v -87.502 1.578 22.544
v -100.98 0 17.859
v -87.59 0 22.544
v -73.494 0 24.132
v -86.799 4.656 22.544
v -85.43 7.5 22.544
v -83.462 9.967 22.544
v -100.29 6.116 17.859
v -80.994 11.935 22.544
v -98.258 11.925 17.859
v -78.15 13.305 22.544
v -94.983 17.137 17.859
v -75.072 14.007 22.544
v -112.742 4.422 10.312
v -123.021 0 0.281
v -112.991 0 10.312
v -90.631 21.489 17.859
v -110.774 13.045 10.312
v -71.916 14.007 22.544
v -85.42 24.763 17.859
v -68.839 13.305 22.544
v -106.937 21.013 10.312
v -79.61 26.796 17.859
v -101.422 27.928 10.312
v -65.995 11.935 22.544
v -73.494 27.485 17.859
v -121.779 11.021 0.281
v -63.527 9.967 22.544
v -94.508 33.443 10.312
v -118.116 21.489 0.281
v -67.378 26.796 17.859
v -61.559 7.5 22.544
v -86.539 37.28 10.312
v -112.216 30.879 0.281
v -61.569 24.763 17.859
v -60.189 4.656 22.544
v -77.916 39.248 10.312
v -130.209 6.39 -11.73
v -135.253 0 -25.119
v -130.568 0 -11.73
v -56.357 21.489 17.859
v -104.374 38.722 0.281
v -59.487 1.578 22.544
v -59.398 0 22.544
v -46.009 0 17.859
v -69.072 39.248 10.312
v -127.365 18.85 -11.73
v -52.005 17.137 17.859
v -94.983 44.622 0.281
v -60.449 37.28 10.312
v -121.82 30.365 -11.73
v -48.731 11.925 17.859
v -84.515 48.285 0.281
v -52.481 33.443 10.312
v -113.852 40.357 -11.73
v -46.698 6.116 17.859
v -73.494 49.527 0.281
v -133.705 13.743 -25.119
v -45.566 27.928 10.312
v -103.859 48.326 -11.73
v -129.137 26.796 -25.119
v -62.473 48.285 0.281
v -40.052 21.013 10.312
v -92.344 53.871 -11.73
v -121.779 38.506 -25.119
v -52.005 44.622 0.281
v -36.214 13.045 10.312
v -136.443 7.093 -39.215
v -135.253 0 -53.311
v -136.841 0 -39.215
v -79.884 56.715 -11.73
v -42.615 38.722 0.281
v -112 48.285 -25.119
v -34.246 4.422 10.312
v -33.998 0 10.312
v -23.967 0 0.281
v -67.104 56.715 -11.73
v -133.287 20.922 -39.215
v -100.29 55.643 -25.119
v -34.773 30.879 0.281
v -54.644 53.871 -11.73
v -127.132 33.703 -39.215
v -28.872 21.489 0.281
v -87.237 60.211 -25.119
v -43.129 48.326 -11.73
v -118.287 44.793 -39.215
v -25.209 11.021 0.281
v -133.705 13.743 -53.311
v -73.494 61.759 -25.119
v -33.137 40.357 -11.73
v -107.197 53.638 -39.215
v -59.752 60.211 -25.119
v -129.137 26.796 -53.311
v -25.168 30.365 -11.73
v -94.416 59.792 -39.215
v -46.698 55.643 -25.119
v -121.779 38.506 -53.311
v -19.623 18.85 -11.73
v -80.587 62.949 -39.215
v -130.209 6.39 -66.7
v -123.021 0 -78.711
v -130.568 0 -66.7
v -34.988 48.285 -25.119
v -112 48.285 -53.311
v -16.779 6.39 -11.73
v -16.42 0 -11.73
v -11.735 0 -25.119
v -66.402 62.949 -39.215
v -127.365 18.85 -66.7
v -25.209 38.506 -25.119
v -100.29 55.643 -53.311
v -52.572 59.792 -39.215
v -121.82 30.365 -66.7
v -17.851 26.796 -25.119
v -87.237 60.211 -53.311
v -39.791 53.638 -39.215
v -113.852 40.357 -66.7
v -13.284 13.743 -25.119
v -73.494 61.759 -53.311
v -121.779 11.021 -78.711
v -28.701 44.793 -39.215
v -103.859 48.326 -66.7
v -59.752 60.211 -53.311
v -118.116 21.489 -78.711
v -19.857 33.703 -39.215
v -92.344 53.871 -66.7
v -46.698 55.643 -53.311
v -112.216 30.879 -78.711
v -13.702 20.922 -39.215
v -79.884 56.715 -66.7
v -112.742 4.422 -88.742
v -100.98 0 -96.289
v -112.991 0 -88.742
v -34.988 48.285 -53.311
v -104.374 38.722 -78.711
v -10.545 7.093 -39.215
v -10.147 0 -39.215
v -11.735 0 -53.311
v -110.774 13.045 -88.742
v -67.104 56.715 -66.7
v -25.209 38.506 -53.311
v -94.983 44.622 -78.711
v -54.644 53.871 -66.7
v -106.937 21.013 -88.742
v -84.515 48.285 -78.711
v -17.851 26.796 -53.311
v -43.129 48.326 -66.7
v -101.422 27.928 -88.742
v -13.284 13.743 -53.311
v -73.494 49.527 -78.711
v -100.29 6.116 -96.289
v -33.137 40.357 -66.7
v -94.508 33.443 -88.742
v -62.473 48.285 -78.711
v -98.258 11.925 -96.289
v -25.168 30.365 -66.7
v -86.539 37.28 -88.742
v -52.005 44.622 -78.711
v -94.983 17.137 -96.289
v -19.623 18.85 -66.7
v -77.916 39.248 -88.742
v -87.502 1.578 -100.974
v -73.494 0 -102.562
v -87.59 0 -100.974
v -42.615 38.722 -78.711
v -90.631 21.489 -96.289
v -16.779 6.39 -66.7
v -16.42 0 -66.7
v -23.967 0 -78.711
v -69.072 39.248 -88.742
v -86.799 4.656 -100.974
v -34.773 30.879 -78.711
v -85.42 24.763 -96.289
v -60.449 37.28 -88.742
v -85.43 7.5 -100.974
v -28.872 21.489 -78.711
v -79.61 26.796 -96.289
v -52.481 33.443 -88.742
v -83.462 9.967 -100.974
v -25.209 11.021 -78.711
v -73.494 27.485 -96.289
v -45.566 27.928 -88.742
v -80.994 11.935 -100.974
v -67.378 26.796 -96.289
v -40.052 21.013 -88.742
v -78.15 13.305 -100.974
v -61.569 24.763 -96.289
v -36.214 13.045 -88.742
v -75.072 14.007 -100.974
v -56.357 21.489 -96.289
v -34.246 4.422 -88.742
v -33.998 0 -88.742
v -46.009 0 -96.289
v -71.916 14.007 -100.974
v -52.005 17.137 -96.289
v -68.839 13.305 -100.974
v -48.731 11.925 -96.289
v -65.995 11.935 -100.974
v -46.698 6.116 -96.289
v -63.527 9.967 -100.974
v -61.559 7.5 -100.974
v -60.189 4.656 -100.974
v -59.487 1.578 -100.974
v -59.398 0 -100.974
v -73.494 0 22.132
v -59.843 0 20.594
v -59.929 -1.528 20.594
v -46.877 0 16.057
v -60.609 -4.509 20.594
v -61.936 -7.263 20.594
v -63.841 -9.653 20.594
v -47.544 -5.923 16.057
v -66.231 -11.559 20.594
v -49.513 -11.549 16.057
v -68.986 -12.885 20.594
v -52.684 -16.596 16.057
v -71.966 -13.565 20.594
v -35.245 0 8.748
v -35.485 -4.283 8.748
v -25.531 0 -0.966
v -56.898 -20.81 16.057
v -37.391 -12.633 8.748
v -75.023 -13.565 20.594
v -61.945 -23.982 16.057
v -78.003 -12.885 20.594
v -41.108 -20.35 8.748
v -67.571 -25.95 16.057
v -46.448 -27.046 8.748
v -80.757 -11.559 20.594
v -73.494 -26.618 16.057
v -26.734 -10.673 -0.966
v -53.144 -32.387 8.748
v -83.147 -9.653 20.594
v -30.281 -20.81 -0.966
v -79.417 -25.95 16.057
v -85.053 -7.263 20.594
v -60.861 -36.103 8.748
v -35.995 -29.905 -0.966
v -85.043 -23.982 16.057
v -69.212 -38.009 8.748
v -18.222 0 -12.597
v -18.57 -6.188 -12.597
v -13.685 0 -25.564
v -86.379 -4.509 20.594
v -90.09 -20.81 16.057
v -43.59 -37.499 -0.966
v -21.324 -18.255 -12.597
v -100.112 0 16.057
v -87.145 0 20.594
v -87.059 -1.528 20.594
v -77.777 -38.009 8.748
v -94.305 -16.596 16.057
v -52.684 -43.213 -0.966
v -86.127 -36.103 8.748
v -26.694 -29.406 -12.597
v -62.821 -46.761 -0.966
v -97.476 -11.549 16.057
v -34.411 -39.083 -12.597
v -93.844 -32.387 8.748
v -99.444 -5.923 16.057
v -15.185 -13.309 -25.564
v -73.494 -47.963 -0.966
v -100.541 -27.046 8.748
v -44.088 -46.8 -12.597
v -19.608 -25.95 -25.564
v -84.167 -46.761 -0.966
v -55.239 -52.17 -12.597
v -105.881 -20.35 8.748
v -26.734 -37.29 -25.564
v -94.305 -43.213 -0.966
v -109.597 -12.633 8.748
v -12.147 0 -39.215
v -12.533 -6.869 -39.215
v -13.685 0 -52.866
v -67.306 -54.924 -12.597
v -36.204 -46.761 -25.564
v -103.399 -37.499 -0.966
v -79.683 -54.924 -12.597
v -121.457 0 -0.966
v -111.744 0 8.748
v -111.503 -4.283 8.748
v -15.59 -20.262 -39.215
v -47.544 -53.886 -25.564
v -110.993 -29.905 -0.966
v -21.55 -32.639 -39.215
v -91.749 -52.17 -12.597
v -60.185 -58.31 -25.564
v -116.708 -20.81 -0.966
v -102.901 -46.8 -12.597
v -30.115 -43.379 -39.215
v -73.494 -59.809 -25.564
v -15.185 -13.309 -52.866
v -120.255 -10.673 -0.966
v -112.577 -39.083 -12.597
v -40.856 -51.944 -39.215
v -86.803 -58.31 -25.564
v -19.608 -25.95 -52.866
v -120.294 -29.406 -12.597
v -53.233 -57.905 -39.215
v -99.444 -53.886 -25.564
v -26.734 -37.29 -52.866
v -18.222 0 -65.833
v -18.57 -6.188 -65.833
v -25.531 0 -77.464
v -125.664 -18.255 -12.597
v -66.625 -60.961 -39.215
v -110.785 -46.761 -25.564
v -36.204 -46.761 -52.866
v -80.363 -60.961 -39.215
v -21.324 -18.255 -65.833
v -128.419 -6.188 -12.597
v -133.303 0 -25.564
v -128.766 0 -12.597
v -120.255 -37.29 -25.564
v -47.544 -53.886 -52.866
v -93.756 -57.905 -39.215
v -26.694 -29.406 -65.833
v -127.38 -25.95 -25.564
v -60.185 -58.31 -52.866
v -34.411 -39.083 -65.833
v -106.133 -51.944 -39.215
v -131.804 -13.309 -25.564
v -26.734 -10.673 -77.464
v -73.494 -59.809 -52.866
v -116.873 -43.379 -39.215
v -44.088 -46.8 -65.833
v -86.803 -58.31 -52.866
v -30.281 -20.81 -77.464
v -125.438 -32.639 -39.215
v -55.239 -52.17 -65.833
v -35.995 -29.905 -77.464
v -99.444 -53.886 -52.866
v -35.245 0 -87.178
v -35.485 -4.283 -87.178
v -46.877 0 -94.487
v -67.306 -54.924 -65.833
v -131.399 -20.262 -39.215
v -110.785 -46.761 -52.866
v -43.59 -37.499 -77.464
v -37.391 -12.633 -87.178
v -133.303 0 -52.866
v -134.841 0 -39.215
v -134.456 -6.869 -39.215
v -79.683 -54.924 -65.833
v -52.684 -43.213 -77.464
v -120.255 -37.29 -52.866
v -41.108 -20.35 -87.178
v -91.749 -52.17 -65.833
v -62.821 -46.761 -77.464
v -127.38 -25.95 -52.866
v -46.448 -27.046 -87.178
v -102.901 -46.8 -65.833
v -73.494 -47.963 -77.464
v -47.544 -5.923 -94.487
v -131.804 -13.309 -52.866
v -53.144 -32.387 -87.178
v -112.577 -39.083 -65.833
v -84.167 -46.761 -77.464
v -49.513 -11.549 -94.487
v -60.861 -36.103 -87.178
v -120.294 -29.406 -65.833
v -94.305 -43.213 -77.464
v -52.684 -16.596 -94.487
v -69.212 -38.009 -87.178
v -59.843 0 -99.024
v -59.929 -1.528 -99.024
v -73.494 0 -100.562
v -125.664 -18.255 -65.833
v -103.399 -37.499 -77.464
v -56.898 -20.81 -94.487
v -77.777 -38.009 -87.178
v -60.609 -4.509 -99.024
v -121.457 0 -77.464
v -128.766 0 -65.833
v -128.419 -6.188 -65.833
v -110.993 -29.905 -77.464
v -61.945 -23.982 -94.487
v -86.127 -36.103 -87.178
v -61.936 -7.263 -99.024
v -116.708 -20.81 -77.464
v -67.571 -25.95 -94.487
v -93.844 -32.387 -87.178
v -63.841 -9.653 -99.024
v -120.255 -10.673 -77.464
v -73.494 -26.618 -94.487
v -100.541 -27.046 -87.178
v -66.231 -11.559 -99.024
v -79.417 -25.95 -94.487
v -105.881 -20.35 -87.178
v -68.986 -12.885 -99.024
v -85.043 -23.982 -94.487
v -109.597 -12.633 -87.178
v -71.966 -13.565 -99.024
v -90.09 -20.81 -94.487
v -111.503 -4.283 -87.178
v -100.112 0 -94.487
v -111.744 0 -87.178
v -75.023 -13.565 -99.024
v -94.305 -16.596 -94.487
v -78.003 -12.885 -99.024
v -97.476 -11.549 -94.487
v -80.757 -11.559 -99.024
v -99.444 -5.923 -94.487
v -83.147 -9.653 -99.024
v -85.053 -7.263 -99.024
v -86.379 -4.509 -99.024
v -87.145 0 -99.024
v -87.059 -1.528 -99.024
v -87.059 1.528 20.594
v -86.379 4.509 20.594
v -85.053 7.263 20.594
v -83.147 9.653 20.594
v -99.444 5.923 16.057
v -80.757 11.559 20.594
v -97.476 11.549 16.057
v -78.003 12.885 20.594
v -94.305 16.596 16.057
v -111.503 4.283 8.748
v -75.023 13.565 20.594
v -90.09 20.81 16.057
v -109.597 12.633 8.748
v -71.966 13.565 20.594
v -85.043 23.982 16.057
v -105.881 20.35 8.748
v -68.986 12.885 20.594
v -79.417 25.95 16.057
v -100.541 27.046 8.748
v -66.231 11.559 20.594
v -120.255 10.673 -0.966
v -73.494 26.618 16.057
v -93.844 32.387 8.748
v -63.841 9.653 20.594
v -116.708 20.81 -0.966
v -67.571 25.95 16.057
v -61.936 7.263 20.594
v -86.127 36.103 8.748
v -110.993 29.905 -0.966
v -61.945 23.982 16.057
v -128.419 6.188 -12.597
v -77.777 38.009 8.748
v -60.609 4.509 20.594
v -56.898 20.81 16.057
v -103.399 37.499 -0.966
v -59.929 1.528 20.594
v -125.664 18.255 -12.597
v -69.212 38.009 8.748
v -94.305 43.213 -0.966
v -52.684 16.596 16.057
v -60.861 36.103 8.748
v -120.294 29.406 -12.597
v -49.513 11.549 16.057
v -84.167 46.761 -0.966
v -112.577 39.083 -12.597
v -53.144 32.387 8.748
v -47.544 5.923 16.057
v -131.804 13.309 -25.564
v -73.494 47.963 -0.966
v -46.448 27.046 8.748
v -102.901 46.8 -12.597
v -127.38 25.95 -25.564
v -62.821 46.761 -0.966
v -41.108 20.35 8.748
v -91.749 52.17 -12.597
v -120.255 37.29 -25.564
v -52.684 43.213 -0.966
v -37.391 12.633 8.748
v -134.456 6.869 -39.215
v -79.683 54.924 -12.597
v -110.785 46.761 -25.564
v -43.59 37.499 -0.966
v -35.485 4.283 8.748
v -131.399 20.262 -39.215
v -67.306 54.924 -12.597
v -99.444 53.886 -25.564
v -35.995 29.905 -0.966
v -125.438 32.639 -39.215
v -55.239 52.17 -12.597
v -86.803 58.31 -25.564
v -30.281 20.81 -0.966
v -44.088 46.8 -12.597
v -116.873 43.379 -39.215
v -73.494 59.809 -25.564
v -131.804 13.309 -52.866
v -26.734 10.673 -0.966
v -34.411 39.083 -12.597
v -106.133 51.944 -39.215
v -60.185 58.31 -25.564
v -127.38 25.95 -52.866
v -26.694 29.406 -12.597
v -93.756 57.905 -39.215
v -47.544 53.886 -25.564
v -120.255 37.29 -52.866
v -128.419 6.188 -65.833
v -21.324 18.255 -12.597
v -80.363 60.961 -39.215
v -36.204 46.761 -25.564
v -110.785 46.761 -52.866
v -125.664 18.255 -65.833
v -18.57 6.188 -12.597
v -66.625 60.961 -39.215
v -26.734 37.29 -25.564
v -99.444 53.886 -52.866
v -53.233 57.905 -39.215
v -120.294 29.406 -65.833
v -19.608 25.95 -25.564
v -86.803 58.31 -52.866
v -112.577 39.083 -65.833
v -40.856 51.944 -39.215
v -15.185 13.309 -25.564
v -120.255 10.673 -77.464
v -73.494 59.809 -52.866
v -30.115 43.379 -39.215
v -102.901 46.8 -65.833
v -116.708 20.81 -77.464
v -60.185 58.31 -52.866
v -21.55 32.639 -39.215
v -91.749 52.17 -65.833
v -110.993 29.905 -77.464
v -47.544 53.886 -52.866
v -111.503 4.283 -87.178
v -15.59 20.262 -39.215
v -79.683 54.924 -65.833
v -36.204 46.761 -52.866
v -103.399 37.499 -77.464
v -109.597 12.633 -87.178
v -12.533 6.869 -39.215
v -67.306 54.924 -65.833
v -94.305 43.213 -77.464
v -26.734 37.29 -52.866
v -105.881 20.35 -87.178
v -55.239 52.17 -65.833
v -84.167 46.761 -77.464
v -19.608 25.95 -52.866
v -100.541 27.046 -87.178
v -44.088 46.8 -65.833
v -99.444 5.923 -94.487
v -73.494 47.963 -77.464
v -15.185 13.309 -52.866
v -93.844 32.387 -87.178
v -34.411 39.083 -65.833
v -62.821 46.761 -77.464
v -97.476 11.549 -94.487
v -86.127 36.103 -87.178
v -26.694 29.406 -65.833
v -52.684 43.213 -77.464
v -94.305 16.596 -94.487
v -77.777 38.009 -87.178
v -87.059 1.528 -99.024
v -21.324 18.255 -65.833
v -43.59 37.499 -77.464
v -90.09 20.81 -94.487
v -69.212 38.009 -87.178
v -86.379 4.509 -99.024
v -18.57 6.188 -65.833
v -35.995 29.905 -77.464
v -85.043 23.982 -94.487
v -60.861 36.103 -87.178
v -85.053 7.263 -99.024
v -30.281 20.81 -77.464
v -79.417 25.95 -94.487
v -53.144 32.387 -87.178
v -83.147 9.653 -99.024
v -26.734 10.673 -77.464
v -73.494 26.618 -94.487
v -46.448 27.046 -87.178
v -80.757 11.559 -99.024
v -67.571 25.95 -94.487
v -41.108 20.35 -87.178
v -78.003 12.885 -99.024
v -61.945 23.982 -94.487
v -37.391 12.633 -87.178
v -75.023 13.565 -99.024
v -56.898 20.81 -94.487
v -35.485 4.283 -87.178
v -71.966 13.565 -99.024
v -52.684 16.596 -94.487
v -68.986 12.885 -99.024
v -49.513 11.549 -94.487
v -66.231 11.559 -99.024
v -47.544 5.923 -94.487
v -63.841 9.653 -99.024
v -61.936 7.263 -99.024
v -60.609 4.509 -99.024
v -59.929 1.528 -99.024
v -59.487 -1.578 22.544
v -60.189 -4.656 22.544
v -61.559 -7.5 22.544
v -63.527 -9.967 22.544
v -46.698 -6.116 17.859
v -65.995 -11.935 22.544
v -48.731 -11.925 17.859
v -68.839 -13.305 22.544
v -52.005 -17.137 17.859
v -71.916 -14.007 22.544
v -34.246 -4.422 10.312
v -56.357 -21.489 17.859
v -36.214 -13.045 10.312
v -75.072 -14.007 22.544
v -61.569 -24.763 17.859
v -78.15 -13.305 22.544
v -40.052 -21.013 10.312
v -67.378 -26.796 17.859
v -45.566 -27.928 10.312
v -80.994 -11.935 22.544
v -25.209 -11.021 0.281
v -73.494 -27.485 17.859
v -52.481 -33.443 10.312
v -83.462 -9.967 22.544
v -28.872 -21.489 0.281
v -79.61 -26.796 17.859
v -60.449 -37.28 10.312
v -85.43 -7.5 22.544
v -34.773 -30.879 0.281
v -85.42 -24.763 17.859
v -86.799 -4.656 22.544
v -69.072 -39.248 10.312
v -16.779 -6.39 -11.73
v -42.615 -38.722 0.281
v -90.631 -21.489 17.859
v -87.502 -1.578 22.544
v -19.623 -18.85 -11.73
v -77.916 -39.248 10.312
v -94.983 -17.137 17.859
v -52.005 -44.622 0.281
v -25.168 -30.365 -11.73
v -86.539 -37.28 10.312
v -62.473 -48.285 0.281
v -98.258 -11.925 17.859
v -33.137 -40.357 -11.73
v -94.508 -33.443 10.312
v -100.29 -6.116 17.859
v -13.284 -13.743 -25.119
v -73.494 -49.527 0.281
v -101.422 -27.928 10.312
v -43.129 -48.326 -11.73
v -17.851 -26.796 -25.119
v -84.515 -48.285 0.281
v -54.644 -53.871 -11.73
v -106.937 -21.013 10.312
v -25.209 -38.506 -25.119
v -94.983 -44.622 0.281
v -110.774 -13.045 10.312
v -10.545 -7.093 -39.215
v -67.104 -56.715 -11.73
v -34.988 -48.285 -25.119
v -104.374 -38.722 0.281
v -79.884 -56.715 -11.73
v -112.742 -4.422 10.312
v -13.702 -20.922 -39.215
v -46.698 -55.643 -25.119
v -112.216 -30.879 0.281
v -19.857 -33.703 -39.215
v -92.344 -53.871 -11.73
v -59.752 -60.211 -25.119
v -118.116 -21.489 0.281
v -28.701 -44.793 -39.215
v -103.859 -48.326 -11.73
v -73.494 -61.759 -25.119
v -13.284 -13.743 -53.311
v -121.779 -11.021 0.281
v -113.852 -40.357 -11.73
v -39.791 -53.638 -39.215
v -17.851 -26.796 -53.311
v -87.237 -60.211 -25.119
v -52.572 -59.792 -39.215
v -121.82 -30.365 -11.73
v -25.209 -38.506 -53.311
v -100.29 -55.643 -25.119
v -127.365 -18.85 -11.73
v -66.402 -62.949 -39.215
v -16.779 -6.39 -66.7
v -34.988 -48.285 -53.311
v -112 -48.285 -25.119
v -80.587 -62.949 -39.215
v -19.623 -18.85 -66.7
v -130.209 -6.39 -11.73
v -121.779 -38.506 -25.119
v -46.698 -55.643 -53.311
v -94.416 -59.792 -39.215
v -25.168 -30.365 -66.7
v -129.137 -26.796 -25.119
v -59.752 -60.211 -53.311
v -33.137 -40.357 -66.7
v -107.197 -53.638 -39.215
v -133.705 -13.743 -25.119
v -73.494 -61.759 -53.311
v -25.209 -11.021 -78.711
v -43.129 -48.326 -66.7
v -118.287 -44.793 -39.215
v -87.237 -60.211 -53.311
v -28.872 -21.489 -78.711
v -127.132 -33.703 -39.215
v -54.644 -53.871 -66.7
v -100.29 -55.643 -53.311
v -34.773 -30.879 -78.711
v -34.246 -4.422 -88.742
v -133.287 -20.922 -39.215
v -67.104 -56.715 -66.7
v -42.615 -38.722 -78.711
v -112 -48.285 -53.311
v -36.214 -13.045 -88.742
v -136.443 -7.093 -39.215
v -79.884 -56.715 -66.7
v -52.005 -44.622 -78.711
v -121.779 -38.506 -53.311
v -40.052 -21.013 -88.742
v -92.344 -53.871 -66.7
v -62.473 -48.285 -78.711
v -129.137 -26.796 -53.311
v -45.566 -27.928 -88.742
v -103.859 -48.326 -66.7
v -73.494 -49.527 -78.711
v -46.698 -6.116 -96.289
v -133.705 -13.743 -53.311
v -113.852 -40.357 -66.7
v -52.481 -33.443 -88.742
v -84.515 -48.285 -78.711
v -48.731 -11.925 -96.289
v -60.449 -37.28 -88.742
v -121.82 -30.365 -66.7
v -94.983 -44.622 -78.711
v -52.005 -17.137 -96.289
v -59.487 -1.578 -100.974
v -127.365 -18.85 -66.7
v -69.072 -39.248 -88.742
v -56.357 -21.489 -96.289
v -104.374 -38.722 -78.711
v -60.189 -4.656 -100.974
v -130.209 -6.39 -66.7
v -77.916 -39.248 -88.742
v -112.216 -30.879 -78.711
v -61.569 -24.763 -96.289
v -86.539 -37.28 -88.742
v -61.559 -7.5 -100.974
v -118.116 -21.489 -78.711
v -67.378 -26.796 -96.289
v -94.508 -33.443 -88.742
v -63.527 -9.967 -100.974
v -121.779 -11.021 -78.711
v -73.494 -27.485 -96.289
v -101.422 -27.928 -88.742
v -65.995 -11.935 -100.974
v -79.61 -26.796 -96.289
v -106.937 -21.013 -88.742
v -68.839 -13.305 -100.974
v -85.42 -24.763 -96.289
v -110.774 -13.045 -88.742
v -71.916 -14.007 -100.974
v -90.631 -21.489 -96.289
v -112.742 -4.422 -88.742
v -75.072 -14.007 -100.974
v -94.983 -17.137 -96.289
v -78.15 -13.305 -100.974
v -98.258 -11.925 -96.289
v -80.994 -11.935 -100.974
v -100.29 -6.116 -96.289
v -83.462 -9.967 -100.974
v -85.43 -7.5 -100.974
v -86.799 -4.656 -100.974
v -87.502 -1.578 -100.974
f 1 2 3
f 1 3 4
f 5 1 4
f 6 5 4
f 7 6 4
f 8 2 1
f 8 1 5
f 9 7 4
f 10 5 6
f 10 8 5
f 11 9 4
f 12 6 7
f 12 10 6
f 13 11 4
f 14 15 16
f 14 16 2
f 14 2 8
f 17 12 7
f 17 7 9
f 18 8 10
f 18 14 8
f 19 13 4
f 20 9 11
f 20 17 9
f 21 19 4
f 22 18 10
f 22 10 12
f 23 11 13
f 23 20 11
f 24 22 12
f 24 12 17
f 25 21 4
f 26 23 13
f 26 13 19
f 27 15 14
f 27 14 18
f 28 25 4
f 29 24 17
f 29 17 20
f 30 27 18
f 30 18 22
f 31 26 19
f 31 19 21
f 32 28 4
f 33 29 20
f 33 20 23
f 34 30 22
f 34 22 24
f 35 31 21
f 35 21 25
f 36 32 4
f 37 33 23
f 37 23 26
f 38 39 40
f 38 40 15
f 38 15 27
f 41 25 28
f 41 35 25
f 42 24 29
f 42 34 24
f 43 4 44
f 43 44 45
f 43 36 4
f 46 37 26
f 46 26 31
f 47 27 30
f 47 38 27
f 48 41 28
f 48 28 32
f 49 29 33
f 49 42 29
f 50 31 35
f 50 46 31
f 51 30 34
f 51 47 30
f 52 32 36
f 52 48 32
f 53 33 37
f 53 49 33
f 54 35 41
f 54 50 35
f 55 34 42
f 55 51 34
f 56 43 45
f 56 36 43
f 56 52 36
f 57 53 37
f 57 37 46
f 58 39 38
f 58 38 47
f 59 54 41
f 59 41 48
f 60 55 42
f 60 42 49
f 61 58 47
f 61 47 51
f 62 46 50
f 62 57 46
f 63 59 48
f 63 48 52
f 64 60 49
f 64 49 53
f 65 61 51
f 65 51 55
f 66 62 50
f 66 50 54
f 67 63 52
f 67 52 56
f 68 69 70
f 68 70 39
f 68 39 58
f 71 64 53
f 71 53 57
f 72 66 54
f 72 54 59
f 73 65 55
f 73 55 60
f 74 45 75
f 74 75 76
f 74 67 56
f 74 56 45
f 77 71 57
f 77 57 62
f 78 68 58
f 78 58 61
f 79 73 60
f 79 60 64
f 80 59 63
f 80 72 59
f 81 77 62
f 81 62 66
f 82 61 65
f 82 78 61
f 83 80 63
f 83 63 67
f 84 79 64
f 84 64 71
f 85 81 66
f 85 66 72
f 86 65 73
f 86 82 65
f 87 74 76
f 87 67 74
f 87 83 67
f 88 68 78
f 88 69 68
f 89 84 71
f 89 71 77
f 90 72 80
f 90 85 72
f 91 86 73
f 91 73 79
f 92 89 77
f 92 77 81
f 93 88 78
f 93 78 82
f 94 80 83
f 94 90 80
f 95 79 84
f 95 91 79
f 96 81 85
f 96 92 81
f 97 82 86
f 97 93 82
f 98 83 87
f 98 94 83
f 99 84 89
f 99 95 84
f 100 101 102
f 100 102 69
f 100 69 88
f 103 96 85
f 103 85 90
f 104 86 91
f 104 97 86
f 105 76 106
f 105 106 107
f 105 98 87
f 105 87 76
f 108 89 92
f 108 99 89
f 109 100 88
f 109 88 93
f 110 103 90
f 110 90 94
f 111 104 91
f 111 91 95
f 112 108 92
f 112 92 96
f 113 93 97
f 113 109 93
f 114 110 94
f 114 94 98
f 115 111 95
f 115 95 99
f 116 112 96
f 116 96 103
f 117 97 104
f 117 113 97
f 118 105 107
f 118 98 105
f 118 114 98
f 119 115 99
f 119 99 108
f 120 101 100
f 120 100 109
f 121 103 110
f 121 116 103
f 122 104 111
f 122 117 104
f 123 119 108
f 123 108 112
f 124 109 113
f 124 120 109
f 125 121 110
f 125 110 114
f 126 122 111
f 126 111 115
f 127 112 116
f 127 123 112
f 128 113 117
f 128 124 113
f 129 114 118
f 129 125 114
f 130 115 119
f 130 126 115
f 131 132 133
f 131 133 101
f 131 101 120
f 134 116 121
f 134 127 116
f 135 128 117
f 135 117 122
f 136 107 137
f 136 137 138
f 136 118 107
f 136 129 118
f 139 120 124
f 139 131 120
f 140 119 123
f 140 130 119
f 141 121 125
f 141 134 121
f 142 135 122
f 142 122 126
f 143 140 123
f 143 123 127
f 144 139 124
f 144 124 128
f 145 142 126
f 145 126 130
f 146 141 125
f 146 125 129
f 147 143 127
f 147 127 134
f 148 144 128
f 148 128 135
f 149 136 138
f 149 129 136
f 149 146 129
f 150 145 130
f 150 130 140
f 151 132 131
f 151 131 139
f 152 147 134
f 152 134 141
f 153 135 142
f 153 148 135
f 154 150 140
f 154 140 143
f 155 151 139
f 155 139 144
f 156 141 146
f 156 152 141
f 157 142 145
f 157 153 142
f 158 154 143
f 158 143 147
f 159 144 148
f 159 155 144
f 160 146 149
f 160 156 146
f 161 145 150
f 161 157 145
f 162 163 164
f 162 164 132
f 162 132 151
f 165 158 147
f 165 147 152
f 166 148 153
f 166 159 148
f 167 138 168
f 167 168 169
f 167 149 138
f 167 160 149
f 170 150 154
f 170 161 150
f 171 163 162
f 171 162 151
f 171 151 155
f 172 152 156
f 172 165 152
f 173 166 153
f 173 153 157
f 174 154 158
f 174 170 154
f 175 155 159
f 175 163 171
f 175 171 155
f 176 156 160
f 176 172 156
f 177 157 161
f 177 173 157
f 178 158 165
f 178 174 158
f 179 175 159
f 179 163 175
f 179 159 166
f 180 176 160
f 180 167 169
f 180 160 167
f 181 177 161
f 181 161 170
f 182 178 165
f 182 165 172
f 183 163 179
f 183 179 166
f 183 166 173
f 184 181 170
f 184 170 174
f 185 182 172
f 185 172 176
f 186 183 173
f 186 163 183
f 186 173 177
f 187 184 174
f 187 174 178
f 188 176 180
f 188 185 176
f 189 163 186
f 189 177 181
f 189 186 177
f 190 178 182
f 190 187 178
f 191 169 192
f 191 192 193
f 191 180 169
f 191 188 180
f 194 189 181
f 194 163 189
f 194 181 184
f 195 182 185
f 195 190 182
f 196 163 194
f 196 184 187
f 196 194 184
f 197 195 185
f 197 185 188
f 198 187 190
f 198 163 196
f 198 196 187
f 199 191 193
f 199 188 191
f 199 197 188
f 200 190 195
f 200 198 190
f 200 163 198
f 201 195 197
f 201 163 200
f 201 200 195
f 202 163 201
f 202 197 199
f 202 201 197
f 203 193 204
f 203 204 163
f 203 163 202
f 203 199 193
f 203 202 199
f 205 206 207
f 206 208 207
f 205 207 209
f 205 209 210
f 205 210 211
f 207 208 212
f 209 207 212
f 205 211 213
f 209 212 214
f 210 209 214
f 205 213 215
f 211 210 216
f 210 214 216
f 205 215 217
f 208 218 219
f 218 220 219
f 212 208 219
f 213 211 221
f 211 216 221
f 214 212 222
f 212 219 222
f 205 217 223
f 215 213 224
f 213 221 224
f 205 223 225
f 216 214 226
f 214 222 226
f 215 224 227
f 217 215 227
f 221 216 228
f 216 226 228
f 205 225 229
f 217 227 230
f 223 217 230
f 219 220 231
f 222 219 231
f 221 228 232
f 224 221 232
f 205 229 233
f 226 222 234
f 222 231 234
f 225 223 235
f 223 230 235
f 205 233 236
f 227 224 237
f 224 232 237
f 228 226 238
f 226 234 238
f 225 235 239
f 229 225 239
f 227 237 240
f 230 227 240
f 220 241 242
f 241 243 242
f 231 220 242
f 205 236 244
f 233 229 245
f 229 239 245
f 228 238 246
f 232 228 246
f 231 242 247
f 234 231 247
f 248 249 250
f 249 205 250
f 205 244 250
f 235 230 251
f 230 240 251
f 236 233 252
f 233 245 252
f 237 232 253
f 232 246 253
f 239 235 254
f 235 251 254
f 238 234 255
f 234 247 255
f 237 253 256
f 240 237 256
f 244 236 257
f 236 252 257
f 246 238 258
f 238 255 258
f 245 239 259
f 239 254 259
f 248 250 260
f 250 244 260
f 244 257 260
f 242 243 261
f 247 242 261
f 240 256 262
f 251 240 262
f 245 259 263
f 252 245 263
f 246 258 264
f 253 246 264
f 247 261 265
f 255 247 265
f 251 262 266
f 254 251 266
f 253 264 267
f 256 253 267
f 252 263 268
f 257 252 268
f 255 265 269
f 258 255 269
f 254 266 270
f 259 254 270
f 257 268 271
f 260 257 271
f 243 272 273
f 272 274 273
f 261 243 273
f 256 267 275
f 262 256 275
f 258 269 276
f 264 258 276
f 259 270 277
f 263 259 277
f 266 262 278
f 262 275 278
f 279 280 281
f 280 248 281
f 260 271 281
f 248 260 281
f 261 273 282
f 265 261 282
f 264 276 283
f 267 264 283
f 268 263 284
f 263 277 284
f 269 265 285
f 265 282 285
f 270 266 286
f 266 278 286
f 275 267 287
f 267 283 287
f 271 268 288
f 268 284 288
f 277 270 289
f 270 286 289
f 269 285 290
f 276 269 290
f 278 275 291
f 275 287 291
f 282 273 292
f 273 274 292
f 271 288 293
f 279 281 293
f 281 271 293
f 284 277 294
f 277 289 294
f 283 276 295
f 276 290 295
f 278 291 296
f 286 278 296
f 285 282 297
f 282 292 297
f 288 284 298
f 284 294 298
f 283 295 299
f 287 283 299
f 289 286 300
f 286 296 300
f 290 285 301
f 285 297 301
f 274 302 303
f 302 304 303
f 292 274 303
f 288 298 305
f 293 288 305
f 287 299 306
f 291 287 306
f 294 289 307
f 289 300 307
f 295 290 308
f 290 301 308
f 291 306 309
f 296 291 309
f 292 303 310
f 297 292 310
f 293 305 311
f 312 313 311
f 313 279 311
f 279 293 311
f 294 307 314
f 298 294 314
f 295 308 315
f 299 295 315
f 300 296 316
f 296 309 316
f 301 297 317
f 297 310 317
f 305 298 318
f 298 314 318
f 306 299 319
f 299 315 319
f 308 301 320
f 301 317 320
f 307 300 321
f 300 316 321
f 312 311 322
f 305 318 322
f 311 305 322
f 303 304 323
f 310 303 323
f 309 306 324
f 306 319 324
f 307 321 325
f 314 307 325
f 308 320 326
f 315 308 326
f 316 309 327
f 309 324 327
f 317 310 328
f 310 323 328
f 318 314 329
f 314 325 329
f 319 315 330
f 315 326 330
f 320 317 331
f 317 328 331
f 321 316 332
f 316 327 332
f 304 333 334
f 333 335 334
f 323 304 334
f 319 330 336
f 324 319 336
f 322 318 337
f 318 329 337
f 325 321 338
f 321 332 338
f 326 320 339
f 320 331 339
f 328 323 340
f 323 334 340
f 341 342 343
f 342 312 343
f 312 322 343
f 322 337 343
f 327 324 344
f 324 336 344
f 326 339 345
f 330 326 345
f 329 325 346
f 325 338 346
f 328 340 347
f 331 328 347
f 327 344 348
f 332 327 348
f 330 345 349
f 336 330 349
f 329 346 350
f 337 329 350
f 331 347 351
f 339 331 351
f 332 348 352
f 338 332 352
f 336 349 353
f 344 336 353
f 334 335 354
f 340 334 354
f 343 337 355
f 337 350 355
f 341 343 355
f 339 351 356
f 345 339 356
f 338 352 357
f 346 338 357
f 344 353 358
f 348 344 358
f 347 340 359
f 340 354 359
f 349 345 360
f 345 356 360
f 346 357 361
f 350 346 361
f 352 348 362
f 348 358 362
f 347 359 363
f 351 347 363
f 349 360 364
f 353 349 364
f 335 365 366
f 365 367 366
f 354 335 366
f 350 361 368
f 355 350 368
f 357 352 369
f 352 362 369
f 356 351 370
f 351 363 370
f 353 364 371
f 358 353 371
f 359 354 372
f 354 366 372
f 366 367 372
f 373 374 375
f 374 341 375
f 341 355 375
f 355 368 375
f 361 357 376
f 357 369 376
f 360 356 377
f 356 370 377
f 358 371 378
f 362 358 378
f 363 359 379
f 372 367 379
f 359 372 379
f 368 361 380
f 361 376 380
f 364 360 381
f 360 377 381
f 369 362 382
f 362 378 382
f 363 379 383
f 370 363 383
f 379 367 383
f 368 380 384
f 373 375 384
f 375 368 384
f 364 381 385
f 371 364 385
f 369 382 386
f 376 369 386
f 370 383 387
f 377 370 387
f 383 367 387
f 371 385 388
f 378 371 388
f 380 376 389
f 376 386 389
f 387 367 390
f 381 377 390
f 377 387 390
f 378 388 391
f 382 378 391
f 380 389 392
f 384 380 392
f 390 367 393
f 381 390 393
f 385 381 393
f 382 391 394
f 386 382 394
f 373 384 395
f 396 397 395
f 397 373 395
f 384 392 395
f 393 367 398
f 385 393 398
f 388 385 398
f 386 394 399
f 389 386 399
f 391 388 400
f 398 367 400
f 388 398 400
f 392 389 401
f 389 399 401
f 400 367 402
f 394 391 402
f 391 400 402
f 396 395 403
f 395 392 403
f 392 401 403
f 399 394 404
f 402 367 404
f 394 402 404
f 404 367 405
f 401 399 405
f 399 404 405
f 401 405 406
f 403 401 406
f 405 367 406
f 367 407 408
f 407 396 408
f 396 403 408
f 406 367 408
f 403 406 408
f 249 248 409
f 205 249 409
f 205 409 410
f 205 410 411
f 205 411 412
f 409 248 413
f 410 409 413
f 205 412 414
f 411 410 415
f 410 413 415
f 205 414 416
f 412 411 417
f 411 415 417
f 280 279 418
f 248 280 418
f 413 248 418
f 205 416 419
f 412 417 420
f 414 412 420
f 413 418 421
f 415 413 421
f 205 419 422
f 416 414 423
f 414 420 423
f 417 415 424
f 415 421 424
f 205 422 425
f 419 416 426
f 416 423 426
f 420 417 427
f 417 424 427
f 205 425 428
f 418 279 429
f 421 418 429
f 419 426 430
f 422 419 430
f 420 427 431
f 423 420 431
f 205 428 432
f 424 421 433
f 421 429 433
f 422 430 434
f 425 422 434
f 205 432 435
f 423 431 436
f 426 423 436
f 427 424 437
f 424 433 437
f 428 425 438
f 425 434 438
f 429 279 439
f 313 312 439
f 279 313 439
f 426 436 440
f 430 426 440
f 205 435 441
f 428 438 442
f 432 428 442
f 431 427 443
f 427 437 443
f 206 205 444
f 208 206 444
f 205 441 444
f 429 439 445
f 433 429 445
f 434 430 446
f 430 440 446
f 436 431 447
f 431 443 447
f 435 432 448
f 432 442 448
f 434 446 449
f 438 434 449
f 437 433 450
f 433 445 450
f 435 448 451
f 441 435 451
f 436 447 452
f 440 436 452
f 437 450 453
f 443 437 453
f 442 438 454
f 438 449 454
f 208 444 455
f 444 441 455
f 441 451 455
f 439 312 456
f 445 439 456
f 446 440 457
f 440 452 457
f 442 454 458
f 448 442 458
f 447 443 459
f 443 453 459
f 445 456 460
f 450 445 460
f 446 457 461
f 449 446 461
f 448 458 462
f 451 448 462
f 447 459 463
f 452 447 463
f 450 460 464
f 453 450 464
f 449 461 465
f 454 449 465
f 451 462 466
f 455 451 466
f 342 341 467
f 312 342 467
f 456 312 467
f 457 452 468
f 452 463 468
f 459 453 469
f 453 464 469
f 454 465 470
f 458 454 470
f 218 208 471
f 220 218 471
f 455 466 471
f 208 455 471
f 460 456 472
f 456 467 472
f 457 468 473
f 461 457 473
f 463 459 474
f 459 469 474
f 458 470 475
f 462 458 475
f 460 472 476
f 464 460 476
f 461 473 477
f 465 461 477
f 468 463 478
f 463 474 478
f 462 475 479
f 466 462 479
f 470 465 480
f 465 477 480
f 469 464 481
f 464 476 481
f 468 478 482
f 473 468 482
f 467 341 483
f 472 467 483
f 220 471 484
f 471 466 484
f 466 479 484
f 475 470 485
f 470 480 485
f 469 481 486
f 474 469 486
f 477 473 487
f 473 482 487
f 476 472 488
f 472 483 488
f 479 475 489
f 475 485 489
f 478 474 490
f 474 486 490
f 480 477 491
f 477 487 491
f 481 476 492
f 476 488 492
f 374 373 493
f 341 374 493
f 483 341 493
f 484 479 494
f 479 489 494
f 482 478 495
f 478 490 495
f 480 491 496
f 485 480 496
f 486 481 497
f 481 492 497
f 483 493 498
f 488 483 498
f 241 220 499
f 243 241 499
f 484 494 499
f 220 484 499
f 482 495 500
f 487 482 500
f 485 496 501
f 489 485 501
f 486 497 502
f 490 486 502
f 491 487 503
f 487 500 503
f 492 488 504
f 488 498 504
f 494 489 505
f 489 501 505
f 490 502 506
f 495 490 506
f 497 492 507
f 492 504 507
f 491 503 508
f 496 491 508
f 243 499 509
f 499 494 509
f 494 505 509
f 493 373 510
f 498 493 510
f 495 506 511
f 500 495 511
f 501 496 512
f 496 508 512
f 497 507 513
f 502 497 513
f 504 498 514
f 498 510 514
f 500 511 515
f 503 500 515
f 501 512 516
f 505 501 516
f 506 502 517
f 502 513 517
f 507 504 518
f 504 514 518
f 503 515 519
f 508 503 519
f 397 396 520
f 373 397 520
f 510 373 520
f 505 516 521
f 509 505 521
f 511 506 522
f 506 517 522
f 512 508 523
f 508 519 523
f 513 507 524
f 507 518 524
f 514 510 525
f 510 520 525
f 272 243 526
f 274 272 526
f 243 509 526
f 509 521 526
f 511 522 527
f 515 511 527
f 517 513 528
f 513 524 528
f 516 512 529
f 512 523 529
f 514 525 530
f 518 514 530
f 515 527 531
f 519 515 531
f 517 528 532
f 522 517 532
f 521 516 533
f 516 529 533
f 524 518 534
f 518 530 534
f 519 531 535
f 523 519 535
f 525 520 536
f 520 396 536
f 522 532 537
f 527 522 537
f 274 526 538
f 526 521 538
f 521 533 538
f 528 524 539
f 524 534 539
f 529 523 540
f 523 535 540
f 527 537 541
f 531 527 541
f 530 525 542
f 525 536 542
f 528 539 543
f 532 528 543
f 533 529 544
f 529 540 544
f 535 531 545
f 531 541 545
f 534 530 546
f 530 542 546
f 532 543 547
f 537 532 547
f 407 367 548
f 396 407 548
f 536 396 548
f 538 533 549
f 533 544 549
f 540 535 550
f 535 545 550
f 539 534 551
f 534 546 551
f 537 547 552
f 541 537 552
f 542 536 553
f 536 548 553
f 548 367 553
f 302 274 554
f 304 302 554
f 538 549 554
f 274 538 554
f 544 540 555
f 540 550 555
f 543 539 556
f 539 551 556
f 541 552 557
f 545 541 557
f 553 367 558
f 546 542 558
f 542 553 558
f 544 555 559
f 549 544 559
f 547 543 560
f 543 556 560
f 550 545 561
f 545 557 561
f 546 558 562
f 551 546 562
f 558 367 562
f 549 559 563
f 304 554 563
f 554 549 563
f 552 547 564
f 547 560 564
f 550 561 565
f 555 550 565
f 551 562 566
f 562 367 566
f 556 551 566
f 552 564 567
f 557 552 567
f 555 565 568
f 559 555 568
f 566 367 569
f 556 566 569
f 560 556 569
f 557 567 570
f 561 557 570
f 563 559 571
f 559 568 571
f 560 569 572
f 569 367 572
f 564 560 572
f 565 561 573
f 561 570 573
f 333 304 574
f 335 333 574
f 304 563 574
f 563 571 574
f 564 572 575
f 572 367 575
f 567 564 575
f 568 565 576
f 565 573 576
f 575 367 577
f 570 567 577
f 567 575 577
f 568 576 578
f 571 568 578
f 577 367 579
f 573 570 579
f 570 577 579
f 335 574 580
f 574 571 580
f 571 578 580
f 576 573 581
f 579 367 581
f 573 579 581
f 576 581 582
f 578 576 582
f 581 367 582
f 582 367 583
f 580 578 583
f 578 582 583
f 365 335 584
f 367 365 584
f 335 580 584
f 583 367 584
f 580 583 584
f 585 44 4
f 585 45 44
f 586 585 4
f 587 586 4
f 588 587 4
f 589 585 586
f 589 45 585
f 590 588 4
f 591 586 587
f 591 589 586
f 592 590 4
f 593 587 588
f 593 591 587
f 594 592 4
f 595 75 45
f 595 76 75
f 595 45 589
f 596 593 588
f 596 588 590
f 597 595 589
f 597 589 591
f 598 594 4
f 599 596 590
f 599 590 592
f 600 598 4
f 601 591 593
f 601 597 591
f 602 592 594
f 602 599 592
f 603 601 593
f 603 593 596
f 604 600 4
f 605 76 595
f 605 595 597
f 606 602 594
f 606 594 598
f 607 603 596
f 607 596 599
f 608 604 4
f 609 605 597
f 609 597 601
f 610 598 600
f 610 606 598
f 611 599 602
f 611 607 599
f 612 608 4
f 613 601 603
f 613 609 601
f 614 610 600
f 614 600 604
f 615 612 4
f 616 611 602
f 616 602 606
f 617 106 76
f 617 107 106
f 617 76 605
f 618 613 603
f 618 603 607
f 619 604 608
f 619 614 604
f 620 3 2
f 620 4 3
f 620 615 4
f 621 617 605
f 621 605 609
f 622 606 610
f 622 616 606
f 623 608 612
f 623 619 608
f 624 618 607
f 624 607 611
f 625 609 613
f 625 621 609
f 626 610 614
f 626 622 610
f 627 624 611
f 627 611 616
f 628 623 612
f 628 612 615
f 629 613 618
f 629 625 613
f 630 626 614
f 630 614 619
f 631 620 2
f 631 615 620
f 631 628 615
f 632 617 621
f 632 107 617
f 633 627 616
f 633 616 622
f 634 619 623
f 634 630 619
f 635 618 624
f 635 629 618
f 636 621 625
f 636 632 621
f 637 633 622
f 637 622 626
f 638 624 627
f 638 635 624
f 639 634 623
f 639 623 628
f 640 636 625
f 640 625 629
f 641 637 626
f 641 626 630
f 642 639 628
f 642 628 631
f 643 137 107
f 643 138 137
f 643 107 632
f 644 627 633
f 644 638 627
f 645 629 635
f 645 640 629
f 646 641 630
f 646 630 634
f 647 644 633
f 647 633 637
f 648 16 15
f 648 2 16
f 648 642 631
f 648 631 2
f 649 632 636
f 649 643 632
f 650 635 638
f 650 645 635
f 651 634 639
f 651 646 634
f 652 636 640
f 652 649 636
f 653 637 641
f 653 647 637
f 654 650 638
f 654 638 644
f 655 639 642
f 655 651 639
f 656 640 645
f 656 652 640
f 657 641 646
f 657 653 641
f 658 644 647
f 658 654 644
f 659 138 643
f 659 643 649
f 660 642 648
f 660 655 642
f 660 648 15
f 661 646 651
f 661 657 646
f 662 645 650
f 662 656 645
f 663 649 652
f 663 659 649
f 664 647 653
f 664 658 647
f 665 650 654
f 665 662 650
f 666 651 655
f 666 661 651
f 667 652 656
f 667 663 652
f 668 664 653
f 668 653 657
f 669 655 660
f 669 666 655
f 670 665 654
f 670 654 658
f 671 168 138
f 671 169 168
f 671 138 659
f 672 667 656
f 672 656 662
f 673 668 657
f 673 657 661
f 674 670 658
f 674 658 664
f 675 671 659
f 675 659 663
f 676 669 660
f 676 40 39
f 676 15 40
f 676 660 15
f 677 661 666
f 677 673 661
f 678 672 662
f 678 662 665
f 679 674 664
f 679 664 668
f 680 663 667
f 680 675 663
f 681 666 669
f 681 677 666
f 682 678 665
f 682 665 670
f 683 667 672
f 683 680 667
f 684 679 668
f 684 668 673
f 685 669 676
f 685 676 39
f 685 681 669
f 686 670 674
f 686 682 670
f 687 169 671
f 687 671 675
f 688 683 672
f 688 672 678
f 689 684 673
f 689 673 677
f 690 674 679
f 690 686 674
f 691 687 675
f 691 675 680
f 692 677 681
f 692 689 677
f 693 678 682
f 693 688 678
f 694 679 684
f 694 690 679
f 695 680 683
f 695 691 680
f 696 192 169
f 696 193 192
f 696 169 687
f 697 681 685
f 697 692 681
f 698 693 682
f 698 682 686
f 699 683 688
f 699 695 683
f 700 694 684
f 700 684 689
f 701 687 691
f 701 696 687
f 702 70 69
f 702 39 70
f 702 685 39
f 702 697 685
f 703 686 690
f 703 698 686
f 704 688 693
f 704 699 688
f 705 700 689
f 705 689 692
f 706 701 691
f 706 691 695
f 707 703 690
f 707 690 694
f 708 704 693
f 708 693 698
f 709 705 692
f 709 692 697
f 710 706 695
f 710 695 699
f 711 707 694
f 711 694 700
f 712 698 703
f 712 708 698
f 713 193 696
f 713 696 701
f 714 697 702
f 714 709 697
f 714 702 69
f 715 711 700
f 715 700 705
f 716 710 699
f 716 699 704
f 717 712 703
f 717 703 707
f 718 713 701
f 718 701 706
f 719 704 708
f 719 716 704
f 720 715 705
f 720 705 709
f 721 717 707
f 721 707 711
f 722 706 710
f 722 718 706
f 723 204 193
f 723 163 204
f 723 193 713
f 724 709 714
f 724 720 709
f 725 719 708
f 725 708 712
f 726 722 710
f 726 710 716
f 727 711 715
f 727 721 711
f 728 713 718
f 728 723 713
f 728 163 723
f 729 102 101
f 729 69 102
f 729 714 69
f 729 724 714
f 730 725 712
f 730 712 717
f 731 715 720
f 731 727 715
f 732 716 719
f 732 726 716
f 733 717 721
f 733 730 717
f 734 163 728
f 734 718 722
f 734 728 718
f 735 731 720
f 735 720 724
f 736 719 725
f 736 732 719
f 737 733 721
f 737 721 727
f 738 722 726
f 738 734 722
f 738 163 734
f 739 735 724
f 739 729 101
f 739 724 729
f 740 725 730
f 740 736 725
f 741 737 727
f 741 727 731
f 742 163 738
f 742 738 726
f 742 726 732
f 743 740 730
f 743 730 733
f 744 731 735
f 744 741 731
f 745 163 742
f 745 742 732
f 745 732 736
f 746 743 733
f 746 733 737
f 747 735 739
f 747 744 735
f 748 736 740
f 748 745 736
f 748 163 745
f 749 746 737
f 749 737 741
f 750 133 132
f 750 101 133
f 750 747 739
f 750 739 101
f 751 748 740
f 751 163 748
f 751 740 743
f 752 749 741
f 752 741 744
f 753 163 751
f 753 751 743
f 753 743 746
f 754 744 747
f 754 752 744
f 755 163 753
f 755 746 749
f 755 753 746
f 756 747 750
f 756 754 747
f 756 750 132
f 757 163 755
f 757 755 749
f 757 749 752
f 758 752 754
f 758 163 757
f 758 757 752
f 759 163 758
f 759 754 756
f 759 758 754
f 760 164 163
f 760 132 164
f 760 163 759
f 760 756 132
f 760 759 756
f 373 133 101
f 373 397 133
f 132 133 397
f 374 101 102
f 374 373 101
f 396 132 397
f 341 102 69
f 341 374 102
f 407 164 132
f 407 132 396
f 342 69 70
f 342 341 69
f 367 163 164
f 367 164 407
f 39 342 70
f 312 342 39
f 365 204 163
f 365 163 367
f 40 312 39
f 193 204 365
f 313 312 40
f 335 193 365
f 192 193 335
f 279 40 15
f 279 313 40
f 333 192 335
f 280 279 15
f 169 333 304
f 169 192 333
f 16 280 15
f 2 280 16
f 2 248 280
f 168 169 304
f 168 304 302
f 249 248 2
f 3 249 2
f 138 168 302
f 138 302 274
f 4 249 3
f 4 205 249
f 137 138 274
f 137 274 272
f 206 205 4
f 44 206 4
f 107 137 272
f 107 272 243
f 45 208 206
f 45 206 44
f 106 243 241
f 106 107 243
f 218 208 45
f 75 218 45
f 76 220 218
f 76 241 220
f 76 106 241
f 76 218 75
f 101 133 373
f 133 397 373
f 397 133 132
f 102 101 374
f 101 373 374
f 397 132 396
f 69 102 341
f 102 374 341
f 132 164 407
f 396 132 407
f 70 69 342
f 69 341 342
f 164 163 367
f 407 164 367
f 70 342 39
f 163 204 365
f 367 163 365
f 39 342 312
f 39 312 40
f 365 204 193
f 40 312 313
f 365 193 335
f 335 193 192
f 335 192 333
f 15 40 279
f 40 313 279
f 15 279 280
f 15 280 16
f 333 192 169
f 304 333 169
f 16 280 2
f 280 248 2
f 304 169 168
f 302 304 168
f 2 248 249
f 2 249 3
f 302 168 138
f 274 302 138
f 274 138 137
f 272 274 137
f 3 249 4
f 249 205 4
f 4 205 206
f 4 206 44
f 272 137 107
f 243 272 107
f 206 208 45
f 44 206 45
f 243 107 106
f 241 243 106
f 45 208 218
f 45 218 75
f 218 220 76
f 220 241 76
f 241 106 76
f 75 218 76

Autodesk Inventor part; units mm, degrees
ref_plane "YZ Plane" through (0, 0, 0) normal (1, 0, 0) x (0, 1, 0)
ref_plane "XY Plane" through (0, 0, 0) normal (0, 0, 1) x (1, 0, 0)
sketch "Sketch1" plane through (0, 0, 0) normal (0, 1, 0) x (-1, 0, 0)
  line L0 (33.043, -39.215) -> (33.043, 9.535)
  line L1 (33.043, -39.215) -> (33.043, -87.965)
  arc A0 (73.4942, 24.1322) -> (73.4942, -102.5622) centre (73.4942, -39.215) ccw
  line L2 (33.043, -39.215) -> (33.043, -87.965)
  line L3 (73.4942, 24.1322) -> (73.4942, -102.5622)
  point P0 (0, 0)
  point P1 (24.033, -39.215)
  point P2 (28.773, -39.215)
  point P3 (56.273, -39.215)
  point P4 (12.147, -39.215)
  point P5 (10.147, -39.215)
  point P6 (16.8762, -39.215)
  dimension "d6" = 9.01
  dimension "d8" = 48.75
  dimension "d9" = 48.75
  dimension "d10" = 126.6944
  dimension "d14" = 4.27
  dimension "d15" = 27.5
  dimension "d16" = 2
  dimension "d17" = 11.8968
revolve "Revolution1" add sketch "Sketch1" angle 360 about axis through (-73.4942, 0, 24.1322) along (0, 0, -1)
shell "Shell1" thickness 2 removed faces 0
split body "Split2" result two bodies by plane through (0, 0, 0) normal (0, 1, 0) first body at (-25.4319, 40.3291, -42.8692)
properties part number "guscio sferico"
